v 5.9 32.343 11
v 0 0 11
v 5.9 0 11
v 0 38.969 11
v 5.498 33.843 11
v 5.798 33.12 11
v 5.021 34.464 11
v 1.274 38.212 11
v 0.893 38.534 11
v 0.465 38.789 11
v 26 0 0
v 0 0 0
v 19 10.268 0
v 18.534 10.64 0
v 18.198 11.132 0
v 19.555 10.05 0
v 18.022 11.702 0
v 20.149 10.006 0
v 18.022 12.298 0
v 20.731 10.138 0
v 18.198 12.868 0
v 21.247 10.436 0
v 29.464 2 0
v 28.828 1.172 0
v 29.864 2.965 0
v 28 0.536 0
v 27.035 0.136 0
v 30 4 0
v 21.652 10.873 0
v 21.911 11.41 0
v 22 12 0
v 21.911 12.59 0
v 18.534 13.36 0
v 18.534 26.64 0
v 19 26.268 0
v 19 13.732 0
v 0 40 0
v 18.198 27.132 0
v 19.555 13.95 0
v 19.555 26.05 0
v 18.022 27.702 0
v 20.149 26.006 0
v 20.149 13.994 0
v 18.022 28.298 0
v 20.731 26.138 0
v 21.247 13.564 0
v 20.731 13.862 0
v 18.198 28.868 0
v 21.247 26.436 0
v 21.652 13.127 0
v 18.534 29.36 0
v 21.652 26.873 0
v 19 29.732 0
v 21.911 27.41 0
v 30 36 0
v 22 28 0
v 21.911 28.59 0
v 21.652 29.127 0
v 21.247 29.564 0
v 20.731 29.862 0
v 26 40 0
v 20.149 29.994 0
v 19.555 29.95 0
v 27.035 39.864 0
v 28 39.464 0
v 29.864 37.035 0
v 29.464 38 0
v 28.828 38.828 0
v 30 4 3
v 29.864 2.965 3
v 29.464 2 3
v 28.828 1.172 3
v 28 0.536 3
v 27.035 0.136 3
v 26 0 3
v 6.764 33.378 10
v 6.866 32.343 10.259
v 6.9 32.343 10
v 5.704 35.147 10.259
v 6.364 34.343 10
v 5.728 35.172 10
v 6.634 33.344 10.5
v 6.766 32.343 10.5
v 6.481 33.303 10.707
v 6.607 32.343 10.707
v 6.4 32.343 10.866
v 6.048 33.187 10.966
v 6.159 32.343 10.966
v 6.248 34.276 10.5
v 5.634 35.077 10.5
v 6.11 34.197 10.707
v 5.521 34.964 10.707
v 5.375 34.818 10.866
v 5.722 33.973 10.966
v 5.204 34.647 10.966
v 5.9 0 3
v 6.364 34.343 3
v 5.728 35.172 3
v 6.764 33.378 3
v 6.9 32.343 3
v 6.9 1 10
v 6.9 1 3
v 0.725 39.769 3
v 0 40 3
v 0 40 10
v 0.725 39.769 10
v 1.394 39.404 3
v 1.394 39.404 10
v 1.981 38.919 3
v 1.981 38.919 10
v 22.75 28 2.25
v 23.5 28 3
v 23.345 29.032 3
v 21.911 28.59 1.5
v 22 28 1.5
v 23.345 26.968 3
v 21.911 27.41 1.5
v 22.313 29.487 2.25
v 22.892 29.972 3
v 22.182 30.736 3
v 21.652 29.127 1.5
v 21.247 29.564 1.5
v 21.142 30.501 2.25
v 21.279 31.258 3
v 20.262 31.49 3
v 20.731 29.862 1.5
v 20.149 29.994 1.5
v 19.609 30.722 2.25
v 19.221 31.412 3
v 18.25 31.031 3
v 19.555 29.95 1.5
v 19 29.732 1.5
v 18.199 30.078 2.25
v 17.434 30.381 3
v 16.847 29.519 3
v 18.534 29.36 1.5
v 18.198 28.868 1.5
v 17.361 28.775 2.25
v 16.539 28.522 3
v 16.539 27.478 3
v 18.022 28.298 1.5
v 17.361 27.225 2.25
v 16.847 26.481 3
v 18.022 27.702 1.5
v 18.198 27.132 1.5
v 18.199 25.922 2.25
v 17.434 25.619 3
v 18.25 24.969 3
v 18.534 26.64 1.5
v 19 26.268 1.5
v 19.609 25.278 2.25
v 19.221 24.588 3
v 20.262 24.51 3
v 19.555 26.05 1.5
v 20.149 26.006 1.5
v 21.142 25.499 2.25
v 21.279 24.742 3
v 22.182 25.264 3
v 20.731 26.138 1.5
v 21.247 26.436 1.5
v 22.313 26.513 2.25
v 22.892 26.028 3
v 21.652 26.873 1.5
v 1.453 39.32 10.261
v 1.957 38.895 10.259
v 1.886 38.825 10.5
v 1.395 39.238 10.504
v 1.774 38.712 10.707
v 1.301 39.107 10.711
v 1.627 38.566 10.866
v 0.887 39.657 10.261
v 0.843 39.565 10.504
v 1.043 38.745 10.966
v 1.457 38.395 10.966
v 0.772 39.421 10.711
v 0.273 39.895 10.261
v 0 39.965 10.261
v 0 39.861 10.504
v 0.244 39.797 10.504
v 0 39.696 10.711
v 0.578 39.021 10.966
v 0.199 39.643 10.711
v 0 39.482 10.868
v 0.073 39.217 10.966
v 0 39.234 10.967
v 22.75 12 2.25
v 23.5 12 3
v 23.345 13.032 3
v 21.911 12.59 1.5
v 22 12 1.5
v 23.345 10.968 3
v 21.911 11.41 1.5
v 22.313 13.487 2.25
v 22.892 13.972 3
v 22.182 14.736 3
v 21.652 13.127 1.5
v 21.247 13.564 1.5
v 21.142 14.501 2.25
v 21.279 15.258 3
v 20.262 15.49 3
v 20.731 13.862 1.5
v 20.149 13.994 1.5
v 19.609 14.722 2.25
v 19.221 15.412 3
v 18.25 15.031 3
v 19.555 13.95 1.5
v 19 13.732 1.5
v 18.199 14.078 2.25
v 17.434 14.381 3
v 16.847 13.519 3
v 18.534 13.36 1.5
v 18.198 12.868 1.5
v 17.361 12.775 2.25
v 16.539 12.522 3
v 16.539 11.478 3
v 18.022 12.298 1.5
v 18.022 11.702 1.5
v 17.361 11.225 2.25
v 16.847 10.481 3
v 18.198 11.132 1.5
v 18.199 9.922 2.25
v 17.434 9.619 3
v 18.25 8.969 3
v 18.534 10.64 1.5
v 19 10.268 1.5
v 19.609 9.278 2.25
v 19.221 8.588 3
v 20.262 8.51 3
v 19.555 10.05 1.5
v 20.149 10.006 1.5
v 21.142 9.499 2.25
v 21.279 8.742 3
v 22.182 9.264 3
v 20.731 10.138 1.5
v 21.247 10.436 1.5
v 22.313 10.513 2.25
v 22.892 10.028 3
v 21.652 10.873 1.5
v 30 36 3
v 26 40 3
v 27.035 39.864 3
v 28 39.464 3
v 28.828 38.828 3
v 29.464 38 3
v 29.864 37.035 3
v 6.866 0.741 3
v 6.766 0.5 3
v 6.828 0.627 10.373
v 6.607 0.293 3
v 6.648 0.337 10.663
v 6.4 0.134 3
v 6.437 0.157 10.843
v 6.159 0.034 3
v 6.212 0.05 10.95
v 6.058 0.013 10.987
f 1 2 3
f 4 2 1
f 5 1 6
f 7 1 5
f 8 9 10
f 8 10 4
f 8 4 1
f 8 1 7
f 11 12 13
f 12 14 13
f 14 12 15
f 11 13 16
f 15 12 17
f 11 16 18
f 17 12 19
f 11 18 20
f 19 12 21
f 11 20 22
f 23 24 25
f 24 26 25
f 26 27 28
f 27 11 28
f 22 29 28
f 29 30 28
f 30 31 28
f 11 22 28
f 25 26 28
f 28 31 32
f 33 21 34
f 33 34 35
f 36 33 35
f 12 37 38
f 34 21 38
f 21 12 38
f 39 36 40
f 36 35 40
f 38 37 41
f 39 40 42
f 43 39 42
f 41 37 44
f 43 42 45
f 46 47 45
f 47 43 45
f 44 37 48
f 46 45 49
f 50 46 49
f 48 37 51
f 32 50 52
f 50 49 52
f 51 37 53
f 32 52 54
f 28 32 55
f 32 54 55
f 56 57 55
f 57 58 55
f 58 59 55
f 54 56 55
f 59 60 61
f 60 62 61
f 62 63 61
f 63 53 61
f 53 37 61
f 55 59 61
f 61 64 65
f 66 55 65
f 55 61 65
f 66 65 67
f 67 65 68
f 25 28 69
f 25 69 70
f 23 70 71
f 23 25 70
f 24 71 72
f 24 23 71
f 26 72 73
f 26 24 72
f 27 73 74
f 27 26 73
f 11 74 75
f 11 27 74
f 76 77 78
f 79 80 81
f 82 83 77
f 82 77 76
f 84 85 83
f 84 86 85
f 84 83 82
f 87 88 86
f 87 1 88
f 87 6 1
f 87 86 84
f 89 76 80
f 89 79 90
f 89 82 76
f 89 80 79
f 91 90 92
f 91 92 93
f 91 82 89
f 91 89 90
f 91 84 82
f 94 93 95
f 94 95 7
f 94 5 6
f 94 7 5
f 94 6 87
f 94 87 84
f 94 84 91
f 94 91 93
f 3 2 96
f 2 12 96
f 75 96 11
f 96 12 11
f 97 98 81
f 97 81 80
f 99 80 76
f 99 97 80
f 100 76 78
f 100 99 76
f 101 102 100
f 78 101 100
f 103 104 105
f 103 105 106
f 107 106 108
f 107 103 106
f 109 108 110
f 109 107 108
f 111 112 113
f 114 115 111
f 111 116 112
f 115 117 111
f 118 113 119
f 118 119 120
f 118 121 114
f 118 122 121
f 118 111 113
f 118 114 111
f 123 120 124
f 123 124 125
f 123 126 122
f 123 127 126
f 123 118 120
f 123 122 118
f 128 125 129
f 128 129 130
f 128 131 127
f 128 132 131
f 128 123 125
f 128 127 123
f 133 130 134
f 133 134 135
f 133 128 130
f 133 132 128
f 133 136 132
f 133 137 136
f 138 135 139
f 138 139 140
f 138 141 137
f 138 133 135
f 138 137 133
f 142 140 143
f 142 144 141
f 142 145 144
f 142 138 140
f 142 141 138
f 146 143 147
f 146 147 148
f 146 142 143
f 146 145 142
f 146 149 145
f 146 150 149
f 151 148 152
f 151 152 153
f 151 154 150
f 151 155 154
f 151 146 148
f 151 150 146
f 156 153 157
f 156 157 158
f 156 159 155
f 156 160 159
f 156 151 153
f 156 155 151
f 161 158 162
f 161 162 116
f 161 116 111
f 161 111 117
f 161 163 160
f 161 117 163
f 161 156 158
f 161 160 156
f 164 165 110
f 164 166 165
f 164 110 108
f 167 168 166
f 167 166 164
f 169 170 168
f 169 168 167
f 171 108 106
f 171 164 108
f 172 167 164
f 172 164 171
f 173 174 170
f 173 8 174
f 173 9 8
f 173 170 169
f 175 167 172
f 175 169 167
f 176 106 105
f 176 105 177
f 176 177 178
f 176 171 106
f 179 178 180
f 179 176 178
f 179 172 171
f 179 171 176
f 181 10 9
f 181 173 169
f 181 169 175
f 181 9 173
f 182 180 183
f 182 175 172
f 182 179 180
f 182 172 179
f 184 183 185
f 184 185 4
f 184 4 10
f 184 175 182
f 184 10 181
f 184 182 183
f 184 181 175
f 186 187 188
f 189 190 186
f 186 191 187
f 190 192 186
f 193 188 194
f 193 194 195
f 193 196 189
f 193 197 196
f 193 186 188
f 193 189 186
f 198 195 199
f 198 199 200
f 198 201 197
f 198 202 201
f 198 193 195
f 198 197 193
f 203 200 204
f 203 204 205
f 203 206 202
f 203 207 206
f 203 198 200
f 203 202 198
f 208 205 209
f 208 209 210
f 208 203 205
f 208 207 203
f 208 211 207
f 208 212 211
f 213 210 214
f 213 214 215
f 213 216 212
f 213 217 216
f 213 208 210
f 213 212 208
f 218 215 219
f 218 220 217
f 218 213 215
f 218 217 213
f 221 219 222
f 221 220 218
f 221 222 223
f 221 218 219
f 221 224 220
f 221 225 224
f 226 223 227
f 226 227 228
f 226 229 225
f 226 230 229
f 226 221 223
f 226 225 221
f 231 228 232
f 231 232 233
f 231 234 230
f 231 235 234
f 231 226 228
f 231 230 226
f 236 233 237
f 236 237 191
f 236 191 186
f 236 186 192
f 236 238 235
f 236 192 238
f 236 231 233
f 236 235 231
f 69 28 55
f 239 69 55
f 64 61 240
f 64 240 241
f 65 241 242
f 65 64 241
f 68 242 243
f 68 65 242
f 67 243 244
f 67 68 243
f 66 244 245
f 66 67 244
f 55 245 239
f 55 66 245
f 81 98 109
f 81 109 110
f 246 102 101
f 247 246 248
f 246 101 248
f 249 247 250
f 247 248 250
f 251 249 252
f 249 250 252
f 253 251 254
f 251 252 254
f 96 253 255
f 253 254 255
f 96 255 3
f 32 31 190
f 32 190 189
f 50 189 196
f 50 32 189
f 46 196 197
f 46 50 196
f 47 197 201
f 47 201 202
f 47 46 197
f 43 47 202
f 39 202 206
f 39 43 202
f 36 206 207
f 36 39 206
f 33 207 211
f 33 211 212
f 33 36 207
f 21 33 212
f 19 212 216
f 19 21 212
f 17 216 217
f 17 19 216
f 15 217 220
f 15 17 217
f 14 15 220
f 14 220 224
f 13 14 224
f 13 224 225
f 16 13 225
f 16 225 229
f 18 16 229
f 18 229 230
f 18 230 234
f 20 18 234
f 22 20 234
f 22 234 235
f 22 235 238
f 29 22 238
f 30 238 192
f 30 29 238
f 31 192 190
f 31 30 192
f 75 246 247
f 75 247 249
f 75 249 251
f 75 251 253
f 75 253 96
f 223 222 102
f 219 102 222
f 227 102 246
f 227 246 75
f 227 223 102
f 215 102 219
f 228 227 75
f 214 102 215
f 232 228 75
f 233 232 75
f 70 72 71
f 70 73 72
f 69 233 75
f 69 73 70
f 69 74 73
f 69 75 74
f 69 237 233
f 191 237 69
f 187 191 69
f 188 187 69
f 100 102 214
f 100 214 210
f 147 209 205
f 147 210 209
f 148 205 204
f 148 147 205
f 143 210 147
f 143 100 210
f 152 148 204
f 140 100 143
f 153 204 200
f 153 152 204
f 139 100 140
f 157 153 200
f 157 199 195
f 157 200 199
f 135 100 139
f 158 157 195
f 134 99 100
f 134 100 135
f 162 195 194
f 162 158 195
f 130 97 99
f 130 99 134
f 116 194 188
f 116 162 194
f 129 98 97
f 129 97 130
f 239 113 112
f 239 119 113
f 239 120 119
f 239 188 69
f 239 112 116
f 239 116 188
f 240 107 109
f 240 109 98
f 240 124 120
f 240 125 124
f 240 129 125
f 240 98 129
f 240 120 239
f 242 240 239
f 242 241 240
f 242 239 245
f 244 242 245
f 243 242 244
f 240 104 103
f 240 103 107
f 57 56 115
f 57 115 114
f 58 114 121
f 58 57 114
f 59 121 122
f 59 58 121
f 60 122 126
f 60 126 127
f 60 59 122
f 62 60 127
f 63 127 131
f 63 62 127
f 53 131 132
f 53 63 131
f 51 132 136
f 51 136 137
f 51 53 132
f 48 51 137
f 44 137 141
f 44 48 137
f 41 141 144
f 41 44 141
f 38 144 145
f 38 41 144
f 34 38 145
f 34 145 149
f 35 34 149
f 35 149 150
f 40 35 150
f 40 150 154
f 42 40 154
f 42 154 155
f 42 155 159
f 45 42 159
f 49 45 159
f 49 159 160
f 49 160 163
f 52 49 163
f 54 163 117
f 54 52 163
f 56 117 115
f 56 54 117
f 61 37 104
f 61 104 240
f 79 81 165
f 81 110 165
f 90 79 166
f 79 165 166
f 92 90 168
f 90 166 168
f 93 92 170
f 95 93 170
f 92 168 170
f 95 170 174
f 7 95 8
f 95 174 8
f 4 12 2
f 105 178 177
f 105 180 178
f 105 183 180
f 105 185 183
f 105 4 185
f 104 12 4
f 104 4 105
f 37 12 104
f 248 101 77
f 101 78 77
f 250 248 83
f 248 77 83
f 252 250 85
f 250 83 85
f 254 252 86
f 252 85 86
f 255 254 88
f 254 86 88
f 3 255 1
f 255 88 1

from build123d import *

# Parameters (mm, degrees)
F0_W        = 6.9
F0_H        = 40
F1_DEPTH    = 11
F0_W_2      = 23.1
F0_R        = 2
F2_DEPTH    = 3
F3_SIZE     = 6
F4_T1_DEPTH = 11.8208999069
F4_T3_DEPTH = 12.1421356237
F4_T5_DEPTH = 23
F5_SIZE     = 1.5
F6_R        = 1


# Not quite as in the source:
# - a fillet or chamfer that OpenCascade refuses, or shapes differently, is made with other operations: its cross-section is extruded or revolved along the edge and cut away or added


with BuildPart() as f1:
    # F0 (on Top) → F1 (new body)
    with BuildSketch(Plane.XY):
        with Locations((3.45, 20)):
            Rectangle(F0_W, F0_H)
    extrude(amount=F1_DEPTH)

    # F0 (on Top) → F2 (join)
    with BuildSketch(Plane.XY):
        with Locations((18.45, 20)):
            Rectangle(F0_W_2, F0_H)
        with Locations((20, 12)):
            Circle(F0_R, mode=Mode.SUBTRACT)
        with Locations((20, 28)):
            Circle(F0_R, mode=Mode.SUBTRACT)
    extrude(amount=F2_DEPTH)

    # F3
    f3_edges = [f1.edges().sort_by_distance(p)[0] for p in [
        (6.9, 40, 7),
    ]]
    chamfer(f3_edges, length=F3_SIZE)

    # F4: fillet of radius 4 on 4 edges, made by hand

    # F4_s2 → F4_t1 (cut)
    with BuildSketch(Plane.XY.offset(3)):
        with BuildLine():
            ThreePointArc((0, 40), (1.0681383035, 39.602199685), (1.9807136938, 38.9192863062))
            Line((1.9807136938, 38.9192863062), (0.9, 40))
            Line((0.9, 40), (0, 40))
        make_face()
    extrude(amount=F4_T1_DEPTH, mode=Mode.SUBTRACT)

    # F4_s4 → F4_t3 (cut)
    with BuildSketch(Plane.XY.offset(3)):
        with BuildLine():
            ThreePointArc((5.7284271247, 35.1715728753), (6.59551813, 33.87387948), (6.9, 32.3431457505))
            Line((6.9, 32.3431457505), (6.9, 34))
            Line((6.9, 34), (5.7284271247, 35.1715728753))
        make_face()
    extrude(amount=F4_T3_DEPTH, mode=Mode.SUBTRACT)

    # F4_s6 → F4_t5 (cut)
    with BuildSketch(Plane.XY.offset(-10)):
        with BuildLine():
            ThreePointArc((26, 40), (28.8284271247, 38.8284271247), (30, 36))
            Line((30, 36), (30, 40))
            Line((30, 40), (26, 40))
        make_face()
        with BuildLine():
            ThreePointArc((30, 4), (28.8284271247, 1.1715728753), (26, 0))
            Line((26, 0), (30, 0))
            Line((30, 0), (30, 4))
        make_face()
    extrude(amount=F4_T5_DEPTH, mode=Mode.SUBTRACT)

    # F5
    f5_edges = [f1.edges().sort_by_distance(p)[0] for p in [
        (18, 28, 3),
        (18, 12, 3),
    ]]
    chamfer(f5_edges, length=F5_SIZE)

    # F6
    f6_edges = [f1.edges().sort_by_distance(p)[0] for p in [
        (6.9, 0, 7),
        (6.9, 16.171573, 11),
        (6.595518, 33.873879, 11),
        (3.85457, 37.04543, 11),
        (1.068138, 39.6022, 11),
    ]]
    fillet(f6_edges, radius=F6_R)


solid = f1.part
